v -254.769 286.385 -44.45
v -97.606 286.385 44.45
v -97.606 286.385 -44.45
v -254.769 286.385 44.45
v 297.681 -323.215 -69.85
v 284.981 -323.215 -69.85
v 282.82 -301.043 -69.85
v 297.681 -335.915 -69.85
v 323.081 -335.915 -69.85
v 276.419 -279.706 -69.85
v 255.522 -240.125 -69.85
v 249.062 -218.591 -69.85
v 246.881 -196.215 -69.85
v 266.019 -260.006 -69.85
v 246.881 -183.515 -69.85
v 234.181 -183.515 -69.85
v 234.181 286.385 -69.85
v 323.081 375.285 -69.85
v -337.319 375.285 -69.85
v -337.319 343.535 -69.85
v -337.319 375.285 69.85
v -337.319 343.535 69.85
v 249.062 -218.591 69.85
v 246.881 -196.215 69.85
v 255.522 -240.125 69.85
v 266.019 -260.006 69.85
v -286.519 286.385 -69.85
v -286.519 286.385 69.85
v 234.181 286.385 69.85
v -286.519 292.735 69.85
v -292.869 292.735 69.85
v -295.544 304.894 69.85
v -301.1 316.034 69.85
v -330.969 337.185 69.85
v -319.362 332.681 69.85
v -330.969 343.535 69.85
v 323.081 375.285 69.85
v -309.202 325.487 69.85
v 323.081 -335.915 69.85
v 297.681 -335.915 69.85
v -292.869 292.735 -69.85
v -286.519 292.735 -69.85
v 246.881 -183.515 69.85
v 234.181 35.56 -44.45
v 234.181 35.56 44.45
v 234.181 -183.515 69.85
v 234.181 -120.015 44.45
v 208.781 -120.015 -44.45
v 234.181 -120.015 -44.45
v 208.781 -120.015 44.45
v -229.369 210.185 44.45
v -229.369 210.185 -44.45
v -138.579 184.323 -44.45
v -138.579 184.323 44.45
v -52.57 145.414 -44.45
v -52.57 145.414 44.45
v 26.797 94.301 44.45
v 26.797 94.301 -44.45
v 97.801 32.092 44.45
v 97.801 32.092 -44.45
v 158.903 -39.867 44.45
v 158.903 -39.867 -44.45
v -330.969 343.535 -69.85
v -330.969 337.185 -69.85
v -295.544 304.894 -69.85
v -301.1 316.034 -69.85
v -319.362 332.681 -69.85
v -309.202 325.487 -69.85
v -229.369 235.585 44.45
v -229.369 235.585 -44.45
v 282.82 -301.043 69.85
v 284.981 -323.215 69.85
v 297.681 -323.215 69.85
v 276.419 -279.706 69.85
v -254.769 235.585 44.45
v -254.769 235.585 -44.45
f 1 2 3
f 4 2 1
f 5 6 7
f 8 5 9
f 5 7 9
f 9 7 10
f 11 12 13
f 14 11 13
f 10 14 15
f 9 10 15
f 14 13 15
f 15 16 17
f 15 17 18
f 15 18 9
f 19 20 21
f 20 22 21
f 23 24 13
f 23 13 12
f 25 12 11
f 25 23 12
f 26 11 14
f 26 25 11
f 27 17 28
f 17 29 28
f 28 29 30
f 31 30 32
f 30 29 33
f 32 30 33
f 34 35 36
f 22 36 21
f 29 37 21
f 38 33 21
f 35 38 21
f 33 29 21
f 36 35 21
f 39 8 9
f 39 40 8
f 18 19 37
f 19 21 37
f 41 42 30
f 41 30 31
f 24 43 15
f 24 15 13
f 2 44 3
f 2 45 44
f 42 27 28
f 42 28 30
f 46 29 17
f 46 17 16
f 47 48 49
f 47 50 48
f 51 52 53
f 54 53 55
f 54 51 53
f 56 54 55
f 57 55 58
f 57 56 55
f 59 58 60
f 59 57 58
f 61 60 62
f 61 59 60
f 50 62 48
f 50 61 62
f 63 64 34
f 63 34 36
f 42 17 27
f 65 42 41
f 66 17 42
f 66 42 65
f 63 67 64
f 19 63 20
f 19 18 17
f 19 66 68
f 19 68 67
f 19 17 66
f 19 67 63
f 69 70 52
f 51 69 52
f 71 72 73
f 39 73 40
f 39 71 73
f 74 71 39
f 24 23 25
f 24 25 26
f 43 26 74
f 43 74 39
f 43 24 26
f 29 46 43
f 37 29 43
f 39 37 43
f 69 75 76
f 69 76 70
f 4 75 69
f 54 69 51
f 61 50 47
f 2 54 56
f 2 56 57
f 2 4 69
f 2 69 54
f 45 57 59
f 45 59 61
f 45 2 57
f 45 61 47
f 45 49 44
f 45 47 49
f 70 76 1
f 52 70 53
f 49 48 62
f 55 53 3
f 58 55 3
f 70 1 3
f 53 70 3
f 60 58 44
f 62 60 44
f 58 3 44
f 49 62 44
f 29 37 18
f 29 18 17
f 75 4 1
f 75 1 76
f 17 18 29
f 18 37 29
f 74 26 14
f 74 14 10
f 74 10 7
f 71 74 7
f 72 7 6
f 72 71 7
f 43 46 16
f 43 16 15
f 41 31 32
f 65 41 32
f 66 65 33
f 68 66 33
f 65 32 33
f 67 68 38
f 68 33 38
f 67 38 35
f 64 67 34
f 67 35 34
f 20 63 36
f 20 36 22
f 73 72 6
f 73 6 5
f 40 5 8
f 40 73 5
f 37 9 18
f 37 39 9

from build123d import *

# Parameters (mm, degrees)
BOSS_EXTRUDE1_DEPTH = 69.85
BOSS_EXTRUDE2_DEPTH = 44.45
BOSS_EXTRUDE3_DEPTH = 69.85


with BuildPart() as part:
    # Sketch1 → Boss-Extrude1 (new body, symmetric)
    with BuildSketch(Plane.XY):
        with BuildLine():
            Line((-330.968776984, 337.185), (-330.968776984, 343.535))
            Line((-330.968776984, 343.535), (-337.318776984, 343.535))
            Line((-337.318776984, 343.535), (-337.318776984, 375.285))
            Line((-337.318776984, 375.285), (323.081223016, 375.285))
            Line((323.081223016, 375.285), (234.181223016, 286.385))
            Line((234.181223016, 286.385), (-286.518776984, 286.385))
            Line((-286.518776984, 286.385), (-286.518776984, 292.735))
            Line((-286.518776984, 292.735), (-292.868776984, 292.735))
            ThreePointArc((-292.868776984, 292.735), (-304.860423906, 321.010016924), (-330.968776984, 337.185))
        make_face()
    extrude(amount=BOSS_EXTRUDE1_DEPTH, both=True)


with BuildPart() as body_2:
    # Sketch1_3 → Boss-Extrude2 (new body, symmetric)
    with BuildSketch(Plane.XY):
        with BuildLine():
            Line((234.181223016, 35.56), (-97.606276984, 286.385))
            Line((-97.606276984, 286.385), (-254.768776984, 286.385))
            Line((-254.768776984, 286.385), (-254.768776984, 235.585))
            Line((-254.768776984, 235.585), (-229.368776984, 235.585))
            Line((-229.368776984, 235.585), (-229.368776984, 210.185))
            ThreePointArc((-229.368776984, 210.185), (26.79686291, 94.301426014), (208.781223016, -120.015))
            Line((208.781223016, -120.015), (234.181223016, -120.015))
            Line((234.181223016, -120.015), (234.181223016, 35.56))
        make_face()
    extrude(amount=BOSS_EXTRUDE2_DEPTH, both=True)


with BuildPart() as body_3:
    # Sketch1_4 → Boss-Extrude3 (new body, symmetric)
    with BuildSketch(Plane.XY):
        with BuildLine():
            Line((323.081223016, -335.915), (323.081223016, 375.285))
            Line((323.081223016, 375.285), (234.181223016, 286.385))
            Line((234.181223016, 286.385), (234.181223016, -183.515))
            Line((234.181223016, -183.515), (246.881223016, -183.515))
            Line((246.881223016, -183.515), (246.881223016, -196.215))
            ThreePointArc((246.881223016, -196.215), (251.768629387, -229.515028089), (266.018608337, -260.006284404))
            ThreePointArc((266.018608337, -260.006284404), (280.138450492, -290.219081757), (284.981223016, -323.215))
            Line((284.981223016, -323.215), (297.681223016, -323.215))
            Line((297.681223016, -323.215), (297.681223016, -335.915))
            Line((297.681223016, -335.915), (323.081223016, -335.915))
        make_face()
    extrude(amount=BOSS_EXTRUDE3_DEPTH, both=True)


solid = Compound([part.part, body_2.part, body_3.part])
